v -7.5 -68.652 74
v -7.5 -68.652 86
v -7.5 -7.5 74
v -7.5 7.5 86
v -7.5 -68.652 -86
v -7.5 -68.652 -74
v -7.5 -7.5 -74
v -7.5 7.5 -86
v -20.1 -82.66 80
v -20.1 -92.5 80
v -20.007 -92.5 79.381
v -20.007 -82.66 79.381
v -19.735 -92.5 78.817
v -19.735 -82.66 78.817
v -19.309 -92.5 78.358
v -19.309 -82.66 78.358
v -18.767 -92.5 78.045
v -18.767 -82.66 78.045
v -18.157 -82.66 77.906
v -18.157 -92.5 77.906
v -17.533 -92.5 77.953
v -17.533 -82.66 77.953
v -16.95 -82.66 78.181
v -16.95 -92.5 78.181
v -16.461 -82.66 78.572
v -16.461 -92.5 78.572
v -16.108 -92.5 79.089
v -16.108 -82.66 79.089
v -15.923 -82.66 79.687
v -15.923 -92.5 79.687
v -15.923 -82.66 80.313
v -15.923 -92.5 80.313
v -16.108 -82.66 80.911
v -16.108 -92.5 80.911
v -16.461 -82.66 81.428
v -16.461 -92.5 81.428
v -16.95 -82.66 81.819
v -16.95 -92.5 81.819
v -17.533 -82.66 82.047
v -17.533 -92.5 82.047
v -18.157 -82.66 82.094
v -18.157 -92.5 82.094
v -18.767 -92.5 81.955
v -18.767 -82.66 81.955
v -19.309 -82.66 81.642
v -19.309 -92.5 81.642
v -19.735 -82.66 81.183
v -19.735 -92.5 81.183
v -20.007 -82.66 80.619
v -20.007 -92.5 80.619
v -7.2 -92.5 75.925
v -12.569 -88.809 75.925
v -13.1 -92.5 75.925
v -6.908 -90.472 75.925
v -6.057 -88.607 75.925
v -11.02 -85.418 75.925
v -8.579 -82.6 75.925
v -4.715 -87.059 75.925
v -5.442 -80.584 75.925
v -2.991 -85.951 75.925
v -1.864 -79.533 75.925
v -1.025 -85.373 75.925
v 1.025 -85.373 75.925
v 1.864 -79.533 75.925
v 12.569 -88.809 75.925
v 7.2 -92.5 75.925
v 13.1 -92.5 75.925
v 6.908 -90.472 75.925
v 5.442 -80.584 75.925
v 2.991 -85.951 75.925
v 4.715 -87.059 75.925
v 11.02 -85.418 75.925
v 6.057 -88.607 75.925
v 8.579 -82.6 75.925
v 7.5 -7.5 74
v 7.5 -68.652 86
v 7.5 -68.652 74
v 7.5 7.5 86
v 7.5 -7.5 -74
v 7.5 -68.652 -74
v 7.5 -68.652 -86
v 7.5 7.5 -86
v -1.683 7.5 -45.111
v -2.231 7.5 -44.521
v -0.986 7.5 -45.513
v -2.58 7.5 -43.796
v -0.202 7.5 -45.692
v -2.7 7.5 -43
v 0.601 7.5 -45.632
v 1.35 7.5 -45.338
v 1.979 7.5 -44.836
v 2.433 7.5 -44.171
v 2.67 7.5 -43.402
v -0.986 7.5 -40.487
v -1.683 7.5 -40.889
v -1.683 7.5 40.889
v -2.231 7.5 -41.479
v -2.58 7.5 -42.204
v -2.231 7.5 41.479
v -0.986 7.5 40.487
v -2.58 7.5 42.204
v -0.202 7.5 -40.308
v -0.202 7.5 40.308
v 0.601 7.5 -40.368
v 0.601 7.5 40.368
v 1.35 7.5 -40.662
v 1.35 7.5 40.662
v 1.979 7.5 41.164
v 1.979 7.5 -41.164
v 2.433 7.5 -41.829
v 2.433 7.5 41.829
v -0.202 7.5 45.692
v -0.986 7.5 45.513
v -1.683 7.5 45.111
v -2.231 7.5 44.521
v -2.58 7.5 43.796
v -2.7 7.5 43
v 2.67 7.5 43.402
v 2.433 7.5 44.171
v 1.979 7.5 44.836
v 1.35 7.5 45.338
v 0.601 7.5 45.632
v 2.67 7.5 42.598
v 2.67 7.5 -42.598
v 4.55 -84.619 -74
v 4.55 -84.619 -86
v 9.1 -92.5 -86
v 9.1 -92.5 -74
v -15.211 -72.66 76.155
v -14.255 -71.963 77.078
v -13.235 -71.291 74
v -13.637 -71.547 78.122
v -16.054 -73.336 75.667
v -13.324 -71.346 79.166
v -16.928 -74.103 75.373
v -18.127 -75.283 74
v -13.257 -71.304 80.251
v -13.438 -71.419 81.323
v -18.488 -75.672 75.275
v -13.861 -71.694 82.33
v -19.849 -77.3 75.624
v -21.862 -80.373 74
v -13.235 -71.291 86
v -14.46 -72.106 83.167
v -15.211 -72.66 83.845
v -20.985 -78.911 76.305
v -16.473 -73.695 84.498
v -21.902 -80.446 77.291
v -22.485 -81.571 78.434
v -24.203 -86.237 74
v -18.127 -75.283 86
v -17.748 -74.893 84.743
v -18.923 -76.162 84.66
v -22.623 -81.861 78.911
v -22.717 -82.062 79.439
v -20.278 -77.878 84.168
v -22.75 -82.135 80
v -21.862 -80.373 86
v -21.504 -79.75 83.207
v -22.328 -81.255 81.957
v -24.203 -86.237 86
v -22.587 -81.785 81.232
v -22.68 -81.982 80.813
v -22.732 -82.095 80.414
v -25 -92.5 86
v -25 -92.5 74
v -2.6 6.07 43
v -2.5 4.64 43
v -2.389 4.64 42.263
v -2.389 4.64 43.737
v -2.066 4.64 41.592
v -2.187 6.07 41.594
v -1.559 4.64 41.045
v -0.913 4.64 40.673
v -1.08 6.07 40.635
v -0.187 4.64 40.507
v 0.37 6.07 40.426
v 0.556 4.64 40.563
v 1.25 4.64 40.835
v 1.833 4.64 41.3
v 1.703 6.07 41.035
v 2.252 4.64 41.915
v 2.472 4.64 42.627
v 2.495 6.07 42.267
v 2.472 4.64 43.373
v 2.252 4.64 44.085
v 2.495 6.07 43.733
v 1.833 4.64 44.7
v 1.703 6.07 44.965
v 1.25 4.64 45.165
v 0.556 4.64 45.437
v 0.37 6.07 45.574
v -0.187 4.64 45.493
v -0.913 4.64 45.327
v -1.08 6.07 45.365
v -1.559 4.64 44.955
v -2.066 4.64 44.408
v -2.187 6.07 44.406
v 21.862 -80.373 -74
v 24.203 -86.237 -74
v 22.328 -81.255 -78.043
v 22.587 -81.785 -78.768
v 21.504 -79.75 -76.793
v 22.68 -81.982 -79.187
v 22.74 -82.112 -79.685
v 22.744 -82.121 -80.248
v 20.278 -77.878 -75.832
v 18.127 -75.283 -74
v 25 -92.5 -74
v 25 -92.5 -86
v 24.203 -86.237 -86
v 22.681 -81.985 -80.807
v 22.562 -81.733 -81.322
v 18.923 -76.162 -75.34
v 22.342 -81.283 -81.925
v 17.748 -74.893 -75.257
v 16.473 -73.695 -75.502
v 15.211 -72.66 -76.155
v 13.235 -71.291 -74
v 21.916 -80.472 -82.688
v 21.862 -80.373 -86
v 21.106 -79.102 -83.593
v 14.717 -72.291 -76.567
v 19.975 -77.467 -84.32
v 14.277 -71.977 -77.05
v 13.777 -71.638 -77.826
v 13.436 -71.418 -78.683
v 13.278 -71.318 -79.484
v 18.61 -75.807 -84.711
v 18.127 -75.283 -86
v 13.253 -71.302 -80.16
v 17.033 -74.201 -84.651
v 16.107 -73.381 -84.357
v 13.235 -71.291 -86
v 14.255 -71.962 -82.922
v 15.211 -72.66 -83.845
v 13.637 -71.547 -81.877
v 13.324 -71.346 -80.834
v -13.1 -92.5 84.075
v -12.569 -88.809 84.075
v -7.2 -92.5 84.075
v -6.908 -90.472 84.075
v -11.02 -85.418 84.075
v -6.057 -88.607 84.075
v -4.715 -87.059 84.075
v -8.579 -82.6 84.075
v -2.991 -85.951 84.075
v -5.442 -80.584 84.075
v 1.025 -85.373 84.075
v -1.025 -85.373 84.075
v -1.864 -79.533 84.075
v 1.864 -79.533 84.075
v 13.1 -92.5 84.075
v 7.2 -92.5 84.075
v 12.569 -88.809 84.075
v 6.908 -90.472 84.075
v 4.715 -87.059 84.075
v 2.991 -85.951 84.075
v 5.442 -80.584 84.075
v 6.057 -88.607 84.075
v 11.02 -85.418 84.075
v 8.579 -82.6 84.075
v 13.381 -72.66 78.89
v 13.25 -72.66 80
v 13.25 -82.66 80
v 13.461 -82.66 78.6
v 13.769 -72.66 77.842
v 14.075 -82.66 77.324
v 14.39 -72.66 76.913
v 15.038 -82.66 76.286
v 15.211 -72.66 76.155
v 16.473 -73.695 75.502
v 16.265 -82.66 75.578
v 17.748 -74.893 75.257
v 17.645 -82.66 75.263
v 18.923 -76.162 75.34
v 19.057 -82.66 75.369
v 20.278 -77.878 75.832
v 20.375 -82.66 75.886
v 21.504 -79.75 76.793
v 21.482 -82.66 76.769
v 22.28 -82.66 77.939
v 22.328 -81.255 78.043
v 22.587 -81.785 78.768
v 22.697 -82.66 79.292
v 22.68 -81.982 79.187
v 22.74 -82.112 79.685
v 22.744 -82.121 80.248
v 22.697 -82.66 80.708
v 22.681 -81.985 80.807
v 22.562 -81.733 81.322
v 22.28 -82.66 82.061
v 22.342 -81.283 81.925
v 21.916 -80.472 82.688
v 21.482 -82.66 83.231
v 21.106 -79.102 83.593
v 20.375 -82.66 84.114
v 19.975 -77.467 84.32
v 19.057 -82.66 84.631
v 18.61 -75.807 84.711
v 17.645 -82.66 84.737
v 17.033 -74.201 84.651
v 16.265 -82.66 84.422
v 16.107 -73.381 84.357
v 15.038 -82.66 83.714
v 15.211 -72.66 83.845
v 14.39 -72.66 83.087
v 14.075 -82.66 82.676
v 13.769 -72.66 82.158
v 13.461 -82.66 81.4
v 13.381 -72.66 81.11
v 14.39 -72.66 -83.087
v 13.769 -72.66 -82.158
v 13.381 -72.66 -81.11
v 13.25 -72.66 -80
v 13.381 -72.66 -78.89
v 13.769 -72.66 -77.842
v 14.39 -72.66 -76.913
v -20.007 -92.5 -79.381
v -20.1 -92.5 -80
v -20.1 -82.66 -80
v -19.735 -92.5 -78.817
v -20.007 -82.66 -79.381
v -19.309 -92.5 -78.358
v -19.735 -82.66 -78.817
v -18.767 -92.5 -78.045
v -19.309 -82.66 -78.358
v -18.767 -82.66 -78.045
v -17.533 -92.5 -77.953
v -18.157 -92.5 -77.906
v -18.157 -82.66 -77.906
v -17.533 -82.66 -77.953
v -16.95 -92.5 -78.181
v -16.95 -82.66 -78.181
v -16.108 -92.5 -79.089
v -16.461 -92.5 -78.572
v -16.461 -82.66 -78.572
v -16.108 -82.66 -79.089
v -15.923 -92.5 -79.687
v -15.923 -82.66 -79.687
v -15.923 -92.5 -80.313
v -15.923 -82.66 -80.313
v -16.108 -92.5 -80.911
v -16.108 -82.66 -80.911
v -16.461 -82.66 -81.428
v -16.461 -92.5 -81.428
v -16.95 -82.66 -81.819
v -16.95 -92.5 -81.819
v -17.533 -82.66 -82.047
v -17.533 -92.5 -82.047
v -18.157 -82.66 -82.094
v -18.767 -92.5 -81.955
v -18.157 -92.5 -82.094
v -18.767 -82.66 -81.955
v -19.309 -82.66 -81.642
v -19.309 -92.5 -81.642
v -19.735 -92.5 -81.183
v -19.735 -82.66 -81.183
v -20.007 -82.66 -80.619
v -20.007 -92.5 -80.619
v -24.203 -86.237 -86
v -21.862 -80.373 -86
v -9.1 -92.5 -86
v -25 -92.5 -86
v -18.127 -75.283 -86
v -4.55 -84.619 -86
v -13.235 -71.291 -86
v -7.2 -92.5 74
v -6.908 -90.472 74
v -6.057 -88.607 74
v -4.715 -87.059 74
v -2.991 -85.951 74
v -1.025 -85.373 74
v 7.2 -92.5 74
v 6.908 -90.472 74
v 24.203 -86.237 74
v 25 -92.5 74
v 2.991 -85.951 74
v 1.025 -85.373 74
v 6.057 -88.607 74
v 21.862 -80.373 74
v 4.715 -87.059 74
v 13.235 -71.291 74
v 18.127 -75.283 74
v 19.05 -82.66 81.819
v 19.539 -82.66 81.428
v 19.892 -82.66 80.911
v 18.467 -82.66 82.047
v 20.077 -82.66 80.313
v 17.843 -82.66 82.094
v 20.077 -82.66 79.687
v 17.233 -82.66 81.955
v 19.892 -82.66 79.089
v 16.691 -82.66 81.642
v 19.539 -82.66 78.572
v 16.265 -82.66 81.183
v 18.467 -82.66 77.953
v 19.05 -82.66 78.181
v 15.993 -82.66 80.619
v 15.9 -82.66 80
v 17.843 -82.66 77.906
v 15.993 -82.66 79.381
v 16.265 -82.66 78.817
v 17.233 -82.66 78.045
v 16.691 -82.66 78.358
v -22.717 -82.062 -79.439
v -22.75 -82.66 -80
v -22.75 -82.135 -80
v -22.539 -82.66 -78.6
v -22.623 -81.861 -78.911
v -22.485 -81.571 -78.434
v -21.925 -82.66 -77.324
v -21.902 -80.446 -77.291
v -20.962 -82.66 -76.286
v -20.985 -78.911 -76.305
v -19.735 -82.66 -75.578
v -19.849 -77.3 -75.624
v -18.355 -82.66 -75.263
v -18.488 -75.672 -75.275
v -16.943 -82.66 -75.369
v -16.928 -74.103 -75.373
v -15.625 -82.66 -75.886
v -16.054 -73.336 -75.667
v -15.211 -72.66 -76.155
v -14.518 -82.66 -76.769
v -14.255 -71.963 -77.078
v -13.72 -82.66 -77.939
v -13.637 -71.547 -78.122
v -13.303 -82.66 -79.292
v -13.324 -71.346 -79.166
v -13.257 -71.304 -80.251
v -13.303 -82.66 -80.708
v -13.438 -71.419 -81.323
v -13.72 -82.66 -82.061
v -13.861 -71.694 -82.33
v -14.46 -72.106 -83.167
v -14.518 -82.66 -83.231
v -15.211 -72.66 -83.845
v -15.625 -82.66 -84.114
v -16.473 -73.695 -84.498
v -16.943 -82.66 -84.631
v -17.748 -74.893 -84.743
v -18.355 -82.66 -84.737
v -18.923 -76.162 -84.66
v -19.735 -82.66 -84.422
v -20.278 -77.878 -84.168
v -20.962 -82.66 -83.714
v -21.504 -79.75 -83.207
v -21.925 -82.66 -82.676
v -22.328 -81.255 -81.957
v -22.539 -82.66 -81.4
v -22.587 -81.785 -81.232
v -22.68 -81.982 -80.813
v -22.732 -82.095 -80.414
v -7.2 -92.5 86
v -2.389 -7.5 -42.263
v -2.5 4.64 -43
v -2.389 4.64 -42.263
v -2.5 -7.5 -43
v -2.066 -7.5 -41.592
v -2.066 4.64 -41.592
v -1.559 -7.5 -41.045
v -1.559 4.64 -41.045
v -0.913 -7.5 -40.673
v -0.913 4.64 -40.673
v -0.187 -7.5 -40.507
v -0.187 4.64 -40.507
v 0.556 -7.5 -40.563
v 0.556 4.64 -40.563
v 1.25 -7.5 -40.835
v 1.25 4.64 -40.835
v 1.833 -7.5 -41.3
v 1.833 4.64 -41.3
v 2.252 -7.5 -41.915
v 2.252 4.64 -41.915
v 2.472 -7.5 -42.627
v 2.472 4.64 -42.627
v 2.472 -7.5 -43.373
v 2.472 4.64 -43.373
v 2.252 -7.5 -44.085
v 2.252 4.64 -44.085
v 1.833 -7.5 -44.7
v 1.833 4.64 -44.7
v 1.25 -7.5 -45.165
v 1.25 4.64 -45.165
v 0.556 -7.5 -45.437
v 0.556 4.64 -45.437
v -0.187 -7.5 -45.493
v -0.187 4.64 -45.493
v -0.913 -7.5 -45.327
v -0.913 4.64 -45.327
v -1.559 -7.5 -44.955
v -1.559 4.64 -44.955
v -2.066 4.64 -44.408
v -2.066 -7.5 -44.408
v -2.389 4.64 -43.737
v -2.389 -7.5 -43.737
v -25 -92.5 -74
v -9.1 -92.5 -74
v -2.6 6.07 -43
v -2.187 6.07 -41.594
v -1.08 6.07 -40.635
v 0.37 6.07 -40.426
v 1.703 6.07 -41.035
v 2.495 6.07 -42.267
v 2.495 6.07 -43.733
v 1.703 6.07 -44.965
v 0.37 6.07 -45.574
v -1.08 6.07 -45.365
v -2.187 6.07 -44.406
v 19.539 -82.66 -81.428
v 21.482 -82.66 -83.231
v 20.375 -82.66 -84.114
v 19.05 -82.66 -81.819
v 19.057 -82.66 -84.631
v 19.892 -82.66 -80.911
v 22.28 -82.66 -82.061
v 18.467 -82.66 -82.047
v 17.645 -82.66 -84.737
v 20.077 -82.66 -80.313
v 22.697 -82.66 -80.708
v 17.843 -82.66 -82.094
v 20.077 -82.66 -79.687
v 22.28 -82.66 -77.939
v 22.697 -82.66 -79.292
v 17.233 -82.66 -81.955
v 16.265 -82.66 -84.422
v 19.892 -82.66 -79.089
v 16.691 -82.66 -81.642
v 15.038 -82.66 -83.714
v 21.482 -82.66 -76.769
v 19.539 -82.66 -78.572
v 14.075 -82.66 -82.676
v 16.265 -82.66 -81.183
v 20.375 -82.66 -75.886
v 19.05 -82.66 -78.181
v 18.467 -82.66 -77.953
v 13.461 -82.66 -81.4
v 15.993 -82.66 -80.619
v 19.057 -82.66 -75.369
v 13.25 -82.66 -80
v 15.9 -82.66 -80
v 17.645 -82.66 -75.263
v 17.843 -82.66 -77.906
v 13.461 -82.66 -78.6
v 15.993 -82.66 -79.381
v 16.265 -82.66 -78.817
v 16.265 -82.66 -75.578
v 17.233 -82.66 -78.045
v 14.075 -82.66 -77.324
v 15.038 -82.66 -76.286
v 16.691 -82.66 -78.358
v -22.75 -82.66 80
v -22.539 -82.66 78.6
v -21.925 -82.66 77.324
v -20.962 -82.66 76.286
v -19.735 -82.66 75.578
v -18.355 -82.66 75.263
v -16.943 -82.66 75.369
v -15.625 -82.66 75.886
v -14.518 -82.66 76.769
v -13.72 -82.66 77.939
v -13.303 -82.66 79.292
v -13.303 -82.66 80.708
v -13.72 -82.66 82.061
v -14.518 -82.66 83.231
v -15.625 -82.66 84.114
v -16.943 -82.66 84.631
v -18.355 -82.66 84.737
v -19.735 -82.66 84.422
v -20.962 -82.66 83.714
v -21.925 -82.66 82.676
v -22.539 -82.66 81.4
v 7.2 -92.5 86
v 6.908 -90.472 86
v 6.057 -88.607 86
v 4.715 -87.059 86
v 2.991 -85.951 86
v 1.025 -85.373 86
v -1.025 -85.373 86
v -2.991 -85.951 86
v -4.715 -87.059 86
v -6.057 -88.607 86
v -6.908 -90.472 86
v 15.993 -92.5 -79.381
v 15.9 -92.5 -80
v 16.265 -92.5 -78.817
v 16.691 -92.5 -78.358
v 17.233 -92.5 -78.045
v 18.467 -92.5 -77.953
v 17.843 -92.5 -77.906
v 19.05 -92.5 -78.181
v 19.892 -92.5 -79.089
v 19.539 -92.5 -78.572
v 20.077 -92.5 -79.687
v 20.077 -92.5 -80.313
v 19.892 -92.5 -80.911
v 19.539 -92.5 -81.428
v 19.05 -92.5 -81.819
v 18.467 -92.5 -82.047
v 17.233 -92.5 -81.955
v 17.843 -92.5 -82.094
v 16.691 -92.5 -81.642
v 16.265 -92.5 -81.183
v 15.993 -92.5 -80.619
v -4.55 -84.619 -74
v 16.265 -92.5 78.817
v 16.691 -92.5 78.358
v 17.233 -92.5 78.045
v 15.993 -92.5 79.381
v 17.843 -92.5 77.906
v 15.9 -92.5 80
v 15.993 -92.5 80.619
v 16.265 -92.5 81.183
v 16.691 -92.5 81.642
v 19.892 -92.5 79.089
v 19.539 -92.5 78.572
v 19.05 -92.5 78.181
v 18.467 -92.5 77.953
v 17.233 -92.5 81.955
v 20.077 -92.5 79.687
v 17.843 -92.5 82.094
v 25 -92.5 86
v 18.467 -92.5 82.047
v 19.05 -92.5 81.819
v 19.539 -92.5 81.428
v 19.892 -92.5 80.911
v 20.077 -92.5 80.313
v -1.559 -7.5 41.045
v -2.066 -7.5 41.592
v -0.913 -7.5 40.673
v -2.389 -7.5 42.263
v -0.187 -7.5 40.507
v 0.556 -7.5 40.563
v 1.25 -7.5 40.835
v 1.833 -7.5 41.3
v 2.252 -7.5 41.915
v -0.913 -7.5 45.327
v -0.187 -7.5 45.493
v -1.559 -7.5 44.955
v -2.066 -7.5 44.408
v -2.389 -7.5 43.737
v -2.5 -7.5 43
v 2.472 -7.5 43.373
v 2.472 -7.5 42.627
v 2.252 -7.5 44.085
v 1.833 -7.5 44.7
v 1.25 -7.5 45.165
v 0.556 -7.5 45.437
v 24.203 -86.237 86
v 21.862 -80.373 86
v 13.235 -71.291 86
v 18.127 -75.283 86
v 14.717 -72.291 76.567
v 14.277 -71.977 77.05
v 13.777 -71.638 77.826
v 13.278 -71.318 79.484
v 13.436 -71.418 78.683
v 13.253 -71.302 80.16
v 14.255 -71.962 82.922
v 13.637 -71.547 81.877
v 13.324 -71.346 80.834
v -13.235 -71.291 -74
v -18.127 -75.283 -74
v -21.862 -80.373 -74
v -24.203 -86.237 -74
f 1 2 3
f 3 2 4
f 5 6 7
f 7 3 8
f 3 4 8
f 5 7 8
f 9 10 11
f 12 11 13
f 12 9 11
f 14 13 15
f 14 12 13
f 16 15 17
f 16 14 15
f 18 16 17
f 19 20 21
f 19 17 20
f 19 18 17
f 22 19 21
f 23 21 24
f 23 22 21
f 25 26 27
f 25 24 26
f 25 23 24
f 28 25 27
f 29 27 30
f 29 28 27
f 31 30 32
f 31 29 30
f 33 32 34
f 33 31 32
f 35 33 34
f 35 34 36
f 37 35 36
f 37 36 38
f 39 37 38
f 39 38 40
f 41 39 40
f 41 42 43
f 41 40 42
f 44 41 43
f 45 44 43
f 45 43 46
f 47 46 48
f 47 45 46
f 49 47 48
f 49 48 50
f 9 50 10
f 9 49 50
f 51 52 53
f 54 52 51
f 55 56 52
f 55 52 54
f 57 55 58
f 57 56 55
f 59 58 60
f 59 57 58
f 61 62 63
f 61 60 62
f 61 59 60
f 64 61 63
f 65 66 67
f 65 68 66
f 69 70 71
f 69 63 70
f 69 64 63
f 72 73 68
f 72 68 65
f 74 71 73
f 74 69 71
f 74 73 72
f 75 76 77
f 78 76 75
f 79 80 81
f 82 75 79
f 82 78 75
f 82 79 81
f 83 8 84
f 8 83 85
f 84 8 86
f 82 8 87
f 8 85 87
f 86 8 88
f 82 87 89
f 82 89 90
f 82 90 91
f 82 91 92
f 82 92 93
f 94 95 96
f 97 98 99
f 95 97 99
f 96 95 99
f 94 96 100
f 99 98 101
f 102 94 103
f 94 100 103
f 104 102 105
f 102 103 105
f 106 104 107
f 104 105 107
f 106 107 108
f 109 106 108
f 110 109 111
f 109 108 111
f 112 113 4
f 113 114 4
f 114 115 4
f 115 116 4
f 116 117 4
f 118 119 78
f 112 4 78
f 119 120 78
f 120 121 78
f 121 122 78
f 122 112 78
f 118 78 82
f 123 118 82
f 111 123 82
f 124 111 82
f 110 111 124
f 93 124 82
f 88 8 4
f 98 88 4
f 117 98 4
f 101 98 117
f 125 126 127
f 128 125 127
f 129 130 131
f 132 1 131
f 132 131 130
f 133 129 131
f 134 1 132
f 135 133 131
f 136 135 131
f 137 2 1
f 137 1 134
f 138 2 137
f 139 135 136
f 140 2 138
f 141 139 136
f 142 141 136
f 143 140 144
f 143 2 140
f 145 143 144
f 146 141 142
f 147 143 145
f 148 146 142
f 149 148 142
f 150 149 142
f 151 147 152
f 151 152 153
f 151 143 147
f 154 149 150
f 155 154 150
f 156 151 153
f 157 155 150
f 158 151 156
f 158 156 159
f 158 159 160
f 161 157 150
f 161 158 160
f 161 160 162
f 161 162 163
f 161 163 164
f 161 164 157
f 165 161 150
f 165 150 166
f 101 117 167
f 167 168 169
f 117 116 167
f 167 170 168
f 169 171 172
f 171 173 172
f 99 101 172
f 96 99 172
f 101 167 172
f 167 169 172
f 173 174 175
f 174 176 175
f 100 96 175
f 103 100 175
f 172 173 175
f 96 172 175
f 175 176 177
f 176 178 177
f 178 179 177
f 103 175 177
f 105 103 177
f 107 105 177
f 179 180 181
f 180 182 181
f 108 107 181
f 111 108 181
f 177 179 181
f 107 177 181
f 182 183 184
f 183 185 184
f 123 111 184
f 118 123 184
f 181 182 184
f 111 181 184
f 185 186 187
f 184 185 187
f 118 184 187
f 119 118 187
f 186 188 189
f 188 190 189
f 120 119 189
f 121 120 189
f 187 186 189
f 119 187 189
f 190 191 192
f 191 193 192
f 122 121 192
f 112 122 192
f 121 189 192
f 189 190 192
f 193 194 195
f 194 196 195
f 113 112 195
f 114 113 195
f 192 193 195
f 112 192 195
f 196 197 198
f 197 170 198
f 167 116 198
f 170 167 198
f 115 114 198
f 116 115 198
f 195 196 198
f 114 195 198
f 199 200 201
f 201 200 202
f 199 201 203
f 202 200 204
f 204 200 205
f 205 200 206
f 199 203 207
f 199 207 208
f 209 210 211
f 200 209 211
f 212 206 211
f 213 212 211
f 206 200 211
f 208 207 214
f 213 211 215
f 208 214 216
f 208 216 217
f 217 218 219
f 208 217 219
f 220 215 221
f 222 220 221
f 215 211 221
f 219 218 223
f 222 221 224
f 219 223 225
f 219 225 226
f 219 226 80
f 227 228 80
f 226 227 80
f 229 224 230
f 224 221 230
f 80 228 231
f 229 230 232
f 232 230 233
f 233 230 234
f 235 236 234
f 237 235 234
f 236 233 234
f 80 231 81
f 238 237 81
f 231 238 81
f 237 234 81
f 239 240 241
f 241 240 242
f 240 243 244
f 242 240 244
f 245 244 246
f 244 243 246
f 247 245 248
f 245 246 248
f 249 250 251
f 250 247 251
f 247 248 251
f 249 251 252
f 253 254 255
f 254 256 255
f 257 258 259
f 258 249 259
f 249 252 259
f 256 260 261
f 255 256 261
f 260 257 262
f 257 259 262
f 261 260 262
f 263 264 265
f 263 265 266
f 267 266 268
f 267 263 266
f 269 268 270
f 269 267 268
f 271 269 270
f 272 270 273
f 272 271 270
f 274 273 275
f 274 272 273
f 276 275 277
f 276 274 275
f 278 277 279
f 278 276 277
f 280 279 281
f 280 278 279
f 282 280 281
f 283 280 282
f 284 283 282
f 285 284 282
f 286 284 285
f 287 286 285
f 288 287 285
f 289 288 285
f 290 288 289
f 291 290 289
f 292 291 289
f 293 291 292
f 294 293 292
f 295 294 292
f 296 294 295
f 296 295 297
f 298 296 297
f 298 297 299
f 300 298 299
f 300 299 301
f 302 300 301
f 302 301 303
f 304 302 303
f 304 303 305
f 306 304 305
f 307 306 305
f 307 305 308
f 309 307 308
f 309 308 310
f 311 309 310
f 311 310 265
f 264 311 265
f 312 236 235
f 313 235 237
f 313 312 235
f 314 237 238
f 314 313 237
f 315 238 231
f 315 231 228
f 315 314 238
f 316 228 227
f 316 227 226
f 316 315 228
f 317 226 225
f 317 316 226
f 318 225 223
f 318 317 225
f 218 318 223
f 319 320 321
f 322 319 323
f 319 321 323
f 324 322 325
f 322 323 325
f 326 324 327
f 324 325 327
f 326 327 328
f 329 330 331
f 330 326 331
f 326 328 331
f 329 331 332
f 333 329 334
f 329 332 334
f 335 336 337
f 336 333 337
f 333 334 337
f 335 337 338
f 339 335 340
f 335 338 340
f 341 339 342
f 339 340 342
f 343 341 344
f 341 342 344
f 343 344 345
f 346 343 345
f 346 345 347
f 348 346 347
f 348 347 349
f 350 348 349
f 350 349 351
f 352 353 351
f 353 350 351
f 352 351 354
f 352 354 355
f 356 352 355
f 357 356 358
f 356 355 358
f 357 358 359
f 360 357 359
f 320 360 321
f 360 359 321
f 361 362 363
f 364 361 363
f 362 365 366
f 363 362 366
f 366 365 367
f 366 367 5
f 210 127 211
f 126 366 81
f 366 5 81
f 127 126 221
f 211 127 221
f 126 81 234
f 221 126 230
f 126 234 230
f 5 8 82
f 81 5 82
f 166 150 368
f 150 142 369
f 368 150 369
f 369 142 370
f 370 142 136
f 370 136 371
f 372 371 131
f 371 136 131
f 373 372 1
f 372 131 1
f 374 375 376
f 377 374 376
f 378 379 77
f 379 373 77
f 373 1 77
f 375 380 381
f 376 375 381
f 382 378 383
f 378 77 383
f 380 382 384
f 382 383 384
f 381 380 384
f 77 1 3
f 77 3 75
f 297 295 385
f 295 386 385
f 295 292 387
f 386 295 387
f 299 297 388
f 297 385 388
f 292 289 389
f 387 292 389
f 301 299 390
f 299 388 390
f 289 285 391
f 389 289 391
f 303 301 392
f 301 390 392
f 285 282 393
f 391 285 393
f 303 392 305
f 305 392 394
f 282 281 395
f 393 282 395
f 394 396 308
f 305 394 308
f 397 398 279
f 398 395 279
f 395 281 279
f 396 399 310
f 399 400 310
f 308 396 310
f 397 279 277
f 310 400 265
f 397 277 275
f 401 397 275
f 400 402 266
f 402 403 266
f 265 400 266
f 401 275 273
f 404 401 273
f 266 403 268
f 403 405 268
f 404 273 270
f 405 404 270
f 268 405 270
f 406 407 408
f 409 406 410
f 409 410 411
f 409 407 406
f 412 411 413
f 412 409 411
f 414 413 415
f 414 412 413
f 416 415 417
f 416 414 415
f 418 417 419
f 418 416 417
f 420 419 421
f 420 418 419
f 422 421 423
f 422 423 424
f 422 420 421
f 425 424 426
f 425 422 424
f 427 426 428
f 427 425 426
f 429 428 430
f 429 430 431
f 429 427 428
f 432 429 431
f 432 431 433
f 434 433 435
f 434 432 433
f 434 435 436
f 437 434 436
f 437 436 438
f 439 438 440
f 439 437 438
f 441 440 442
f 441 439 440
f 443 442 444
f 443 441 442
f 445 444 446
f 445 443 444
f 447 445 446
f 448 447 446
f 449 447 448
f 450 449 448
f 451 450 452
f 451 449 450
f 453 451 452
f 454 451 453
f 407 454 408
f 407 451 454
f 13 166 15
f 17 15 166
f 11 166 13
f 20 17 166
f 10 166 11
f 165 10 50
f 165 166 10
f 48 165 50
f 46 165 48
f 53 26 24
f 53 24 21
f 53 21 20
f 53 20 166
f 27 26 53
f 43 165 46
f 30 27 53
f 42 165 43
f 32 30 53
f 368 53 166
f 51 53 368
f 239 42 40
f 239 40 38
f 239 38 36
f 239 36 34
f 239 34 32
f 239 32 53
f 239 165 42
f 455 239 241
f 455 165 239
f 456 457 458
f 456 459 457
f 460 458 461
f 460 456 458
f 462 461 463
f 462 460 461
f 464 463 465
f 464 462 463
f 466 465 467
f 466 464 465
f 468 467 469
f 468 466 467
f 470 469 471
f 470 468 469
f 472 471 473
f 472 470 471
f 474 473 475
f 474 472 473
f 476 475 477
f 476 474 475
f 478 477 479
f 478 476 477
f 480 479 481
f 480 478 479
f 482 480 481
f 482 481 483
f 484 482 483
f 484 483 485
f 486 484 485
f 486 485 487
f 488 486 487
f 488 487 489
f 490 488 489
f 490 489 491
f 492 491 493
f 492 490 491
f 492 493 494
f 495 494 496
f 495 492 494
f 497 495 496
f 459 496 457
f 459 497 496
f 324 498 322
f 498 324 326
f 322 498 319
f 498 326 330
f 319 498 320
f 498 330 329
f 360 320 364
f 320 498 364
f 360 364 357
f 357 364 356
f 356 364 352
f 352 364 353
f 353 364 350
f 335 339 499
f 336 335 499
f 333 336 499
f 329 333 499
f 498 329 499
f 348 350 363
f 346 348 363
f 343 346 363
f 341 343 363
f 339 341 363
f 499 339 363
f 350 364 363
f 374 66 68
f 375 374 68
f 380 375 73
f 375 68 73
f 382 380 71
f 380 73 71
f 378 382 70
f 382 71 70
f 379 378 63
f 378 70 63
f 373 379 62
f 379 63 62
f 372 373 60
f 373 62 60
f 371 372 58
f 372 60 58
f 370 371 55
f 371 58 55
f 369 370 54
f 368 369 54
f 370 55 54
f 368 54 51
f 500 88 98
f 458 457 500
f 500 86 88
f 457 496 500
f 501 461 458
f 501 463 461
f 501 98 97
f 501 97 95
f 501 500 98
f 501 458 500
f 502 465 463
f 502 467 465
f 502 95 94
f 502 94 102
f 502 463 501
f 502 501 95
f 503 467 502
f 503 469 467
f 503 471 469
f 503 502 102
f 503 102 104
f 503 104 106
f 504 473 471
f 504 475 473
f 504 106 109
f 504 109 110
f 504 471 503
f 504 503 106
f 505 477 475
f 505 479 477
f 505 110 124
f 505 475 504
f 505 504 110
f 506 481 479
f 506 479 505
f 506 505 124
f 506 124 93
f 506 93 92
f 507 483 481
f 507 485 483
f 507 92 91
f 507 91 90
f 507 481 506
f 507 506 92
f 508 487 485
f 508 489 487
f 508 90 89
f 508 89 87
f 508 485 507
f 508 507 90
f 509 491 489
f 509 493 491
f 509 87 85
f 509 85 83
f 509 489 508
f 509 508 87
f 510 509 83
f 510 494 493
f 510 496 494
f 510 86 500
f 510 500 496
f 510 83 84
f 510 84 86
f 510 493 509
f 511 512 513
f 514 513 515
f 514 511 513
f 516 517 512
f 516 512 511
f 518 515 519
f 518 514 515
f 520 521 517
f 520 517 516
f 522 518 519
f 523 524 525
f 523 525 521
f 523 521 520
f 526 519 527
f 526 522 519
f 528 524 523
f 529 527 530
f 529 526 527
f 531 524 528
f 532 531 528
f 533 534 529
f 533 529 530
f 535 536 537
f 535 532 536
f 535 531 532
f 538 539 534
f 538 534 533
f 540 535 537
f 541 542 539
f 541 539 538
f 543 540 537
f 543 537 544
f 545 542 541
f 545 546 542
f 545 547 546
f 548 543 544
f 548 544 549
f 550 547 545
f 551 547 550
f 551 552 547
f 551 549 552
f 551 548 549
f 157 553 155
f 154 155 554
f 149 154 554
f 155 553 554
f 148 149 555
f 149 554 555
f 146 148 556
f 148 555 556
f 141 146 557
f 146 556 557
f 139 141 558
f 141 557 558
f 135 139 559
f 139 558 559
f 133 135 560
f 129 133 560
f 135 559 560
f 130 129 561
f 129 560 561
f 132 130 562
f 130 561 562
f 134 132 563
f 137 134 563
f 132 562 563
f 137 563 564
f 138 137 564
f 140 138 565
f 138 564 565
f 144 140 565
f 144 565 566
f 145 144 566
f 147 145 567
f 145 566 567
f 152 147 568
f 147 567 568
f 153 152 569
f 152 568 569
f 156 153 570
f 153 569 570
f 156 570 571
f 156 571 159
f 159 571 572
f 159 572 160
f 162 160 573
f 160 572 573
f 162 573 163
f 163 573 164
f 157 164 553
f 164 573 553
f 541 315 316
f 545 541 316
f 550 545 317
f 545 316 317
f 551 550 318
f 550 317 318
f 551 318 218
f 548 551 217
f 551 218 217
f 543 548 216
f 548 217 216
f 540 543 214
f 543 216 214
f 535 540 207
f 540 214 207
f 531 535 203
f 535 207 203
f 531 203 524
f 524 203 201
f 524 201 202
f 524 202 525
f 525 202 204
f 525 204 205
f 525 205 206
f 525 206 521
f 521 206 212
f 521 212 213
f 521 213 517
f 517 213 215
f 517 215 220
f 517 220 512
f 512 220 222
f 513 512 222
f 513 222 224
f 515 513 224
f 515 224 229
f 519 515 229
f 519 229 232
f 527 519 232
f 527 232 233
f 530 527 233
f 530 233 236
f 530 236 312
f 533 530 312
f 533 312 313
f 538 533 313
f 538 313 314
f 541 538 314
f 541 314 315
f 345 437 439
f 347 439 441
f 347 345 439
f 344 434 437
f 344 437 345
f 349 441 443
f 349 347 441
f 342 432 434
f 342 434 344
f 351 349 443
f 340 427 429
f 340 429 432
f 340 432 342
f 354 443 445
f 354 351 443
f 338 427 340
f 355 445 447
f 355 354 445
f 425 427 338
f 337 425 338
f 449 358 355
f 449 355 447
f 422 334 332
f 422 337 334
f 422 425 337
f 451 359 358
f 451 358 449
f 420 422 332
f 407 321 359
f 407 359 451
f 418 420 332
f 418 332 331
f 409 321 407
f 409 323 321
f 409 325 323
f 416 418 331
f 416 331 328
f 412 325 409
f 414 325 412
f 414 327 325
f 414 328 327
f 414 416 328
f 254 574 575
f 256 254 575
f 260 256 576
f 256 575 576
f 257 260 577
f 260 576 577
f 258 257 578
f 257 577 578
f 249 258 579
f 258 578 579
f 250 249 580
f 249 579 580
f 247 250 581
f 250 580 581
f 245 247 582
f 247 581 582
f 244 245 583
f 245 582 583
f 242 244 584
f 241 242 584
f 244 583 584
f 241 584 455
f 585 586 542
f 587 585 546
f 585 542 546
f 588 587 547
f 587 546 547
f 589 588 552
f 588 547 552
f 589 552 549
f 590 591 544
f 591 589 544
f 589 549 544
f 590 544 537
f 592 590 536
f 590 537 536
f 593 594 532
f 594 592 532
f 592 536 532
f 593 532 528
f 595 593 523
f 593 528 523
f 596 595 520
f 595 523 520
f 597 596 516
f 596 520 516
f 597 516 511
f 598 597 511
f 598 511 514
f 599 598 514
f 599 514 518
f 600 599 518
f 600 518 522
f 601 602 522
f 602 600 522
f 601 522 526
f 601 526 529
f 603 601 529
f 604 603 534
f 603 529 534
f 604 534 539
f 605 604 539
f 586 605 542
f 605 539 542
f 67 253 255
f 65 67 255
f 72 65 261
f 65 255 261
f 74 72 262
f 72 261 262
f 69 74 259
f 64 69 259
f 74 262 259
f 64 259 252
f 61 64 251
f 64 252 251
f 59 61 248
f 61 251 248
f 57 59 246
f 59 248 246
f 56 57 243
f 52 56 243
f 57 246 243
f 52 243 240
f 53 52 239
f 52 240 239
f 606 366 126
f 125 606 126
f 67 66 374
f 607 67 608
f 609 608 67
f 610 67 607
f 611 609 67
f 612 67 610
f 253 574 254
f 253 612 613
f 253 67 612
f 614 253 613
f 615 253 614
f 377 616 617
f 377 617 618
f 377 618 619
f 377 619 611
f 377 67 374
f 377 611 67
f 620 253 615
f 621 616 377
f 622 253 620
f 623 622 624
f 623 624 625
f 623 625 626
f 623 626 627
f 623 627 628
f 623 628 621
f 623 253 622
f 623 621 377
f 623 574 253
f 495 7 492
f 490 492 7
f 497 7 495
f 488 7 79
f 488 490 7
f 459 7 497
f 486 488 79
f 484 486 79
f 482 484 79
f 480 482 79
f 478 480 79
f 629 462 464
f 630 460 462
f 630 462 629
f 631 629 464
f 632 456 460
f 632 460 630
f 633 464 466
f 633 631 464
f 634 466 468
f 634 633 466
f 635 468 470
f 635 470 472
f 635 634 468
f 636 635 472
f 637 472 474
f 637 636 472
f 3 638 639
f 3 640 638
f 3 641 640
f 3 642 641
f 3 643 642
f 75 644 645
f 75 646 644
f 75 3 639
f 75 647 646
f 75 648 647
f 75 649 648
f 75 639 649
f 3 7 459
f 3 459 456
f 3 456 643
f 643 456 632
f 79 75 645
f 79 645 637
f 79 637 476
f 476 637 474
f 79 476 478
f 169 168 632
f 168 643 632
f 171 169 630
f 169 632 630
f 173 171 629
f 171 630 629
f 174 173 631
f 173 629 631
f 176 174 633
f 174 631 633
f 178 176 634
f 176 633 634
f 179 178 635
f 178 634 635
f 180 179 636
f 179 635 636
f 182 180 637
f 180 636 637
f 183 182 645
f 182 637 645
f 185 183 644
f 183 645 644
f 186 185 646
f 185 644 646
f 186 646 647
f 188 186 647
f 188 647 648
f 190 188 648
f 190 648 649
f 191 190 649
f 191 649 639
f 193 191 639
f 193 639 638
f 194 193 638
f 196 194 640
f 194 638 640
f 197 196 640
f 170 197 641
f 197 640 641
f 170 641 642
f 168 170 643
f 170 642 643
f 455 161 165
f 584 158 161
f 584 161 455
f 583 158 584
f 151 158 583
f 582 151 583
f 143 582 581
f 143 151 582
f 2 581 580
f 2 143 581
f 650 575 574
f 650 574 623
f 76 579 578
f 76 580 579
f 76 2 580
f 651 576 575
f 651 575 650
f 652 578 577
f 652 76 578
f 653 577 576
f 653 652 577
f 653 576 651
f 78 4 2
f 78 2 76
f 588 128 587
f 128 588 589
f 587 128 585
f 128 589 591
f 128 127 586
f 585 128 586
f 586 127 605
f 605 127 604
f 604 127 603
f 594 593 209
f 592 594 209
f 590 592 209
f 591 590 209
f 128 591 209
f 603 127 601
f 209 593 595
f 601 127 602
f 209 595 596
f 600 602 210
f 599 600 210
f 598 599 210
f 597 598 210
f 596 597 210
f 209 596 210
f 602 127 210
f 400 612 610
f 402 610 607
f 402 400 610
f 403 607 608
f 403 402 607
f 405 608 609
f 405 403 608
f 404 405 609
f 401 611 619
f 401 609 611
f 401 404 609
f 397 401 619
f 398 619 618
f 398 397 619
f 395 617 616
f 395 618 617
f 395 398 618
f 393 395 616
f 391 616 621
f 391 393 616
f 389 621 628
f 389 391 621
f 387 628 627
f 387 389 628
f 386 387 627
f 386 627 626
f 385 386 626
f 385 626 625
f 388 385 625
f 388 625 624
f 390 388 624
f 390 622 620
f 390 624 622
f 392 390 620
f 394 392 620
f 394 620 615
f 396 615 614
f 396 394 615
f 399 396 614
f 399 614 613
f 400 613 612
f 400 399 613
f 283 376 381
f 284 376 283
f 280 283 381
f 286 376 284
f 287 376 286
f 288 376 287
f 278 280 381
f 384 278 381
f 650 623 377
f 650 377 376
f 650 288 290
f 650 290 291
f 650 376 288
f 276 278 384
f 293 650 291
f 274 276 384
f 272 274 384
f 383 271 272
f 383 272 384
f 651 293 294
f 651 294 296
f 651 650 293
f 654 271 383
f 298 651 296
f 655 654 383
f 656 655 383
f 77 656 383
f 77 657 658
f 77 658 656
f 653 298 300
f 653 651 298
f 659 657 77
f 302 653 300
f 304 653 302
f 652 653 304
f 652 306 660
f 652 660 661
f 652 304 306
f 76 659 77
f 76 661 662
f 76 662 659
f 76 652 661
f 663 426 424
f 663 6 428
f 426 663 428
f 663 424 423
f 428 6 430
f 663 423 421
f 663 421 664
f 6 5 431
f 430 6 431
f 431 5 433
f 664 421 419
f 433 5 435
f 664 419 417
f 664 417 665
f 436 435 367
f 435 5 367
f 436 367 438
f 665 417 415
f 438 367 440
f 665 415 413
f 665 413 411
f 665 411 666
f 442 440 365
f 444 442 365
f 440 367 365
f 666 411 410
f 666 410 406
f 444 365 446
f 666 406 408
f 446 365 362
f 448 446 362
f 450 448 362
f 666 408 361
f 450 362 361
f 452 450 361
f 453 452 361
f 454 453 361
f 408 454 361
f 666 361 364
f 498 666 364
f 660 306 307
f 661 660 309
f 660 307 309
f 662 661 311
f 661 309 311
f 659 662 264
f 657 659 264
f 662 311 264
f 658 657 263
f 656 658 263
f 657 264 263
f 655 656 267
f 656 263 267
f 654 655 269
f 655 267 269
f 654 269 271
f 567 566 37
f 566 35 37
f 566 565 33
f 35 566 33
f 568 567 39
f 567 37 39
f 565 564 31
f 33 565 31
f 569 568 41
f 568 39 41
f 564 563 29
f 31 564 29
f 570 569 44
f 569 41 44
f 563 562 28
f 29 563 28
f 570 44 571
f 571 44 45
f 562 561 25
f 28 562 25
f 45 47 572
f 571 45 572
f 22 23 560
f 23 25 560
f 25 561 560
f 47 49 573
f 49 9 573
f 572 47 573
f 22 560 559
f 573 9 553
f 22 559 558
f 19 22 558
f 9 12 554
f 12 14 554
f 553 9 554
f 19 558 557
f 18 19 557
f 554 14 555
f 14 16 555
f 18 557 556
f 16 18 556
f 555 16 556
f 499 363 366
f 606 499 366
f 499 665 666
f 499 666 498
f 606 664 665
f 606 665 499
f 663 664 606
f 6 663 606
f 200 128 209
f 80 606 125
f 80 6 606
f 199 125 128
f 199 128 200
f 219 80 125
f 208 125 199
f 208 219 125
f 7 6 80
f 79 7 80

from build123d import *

# Parameters (mm, degrees)
SKETCH2_W                                       = 15
SKETCH2_H                                       = 15
BOSS_EXTRUDE1_DEPTH                             = 86
SKETCH3_W                                       = 15
SKETCH3_H                                       = 12
BOSS_EXTRUDE2_DEPTH                             = 85
BOSS_EXTRUDE3_DEPTH                             = 12
SKETCH6_R                                       = 4.75
SKETCH6_R_2                                     = 2.1
CUT_EXTRUDE1_DEPTH                              = 10
CUT_EXTRUDE1_DIRECTION_2_REACH                  = 82.16
CUT_EXTRUDE2_REACH                              = 21.84
SKETCH6_2_R                                     = 2.1
CSK_FOR_M3_OVAL_HEAD_MACHINE_SCREW1_D           = 5
CSK_FOR_M3_OVAL_HEAD_MACHINE_SCREW1_CSINK_D     = 5.4
CSK_FOR_M3_OVAL_HEAD_MACHINE_SCREW1_CSINK_ANGLE = 8
CUT_EXTRUDE4_REACH                              = 174
SKETCH8_R                                       = 7.2
CUT_EXTRUDE5_START                              = -1.925
SKETCH9_R                                       = 13.1
CUT_EXTRUDE5_DEPTH                              = 8.15
CUT_EXTRUDE6_REACH                              = 174


with BuildPart() as part:
    # Sketch2 → Boss-Extrude1 (new body)
    with BuildSketch(Plane.XY):
        Rectangle(SKETCH2_W, SKETCH2_H)
    extrude(amount=BOSS_EXTRUDE1_DEPTH)

    # Sketch3 → Boss-Extrude2 (add)
    with BuildSketch(Plane.XZ.offset(7.5)):
        with Locations((0, 80)):
            Rectangle(SKETCH3_W, SKETCH3_H)
    extrude(amount=BOSS_EXTRUDE2_DEPTH)

    # Sketch4 → Boss-Extrude3 (add)
    with BuildSketch(Plane.XY.offset(86)):
        with BuildLine():
            Line((-25, -92.5), (25, -92.5))
            ThreePointArc((25, -92.5), (0, -67.5), (-25, -92.5))
        make_face()
    extrude(amount=-BOSS_EXTRUDE3_DEPTH)

    # Sketch6 → Cut-Extrude1 (cut)
    with BuildSketch(Plane(origin=(0, -72.66, 0), x_dir=(-1, 0, 0), z_dir=(0, -1, 0))):
        with Locations((-18, -80)):
            Circle(SKETCH6_R)
        with Locations((-18, -80)):
            Circle(SKETCH6_R_2, mode=Mode.SUBTRACT)
        with Locations((18, -80)):
            Circle(SKETCH6_R)
        with Locations((18, -80)):
            Circle(SKETCH6_R_2, mode=Mode.SUBTRACT)
    extrude(amount=CUT_EXTRUDE1_DEPTH, mode=Mode.SUBTRACT)

    # Sketch6 → Cut-Extrude1 direction 2 (cut, up to next)
    with BuildSketch(Plane(origin=(0, -72.66, 0), x_dir=(-1, 0, 0), z_dir=(0, -1, 0)), mode=Mode.PRIVATE) as cut_extrude1_direction_2_sk1:
        with Locations((-18, -80)):
            Circle(SKETCH6_R)
        with Locations((-18, -80)):
            Circle(SKETCH6_R_2, mode=Mode.SUBTRACT)
    cut_extrude1_direction_2_tool1 = extrude(cut_extrude1_direction_2_sk1.sketch, amount=-CUT_EXTRUDE1_DIRECTION_2_REACH, mode=Mode.PRIVATE) & part.part
    add(cut_extrude1_direction_2_tool1.solids().sort_by_distance((22.61565, -72.66, 80))[0], mode=Mode.SUBTRACT)
    # Sketch6 → Cut-Extrude1 direction 2 (cut, up to next)
    with BuildSketch(Plane(origin=(0, -72.66, 0), x_dir=(-1, 0, 0), z_dir=(0, -1, 0)), mode=Mode.PRIVATE) as cut_extrude1_direction_2_sk2:
        with Locations((18, -80)):
            Circle(SKETCH6_R)
        with Locations((18, -80)):
            Circle(SKETCH6_R_2, mode=Mode.SUBTRACT)
    cut_extrude1_direction_2_tool2 = extrude(cut_extrude1_direction_2_sk2.sketch, amount=-CUT_EXTRUDE1_DIRECTION_2_REACH, mode=Mode.PRIVATE) & part.part
    add(cut_extrude1_direction_2_tool2.solids().sort_by_distance((-13.38435, -72.66, 80))[0], mode=Mode.SUBTRACT)

    # Sketch6<2> → Cut-Extrude2 (cut, up to next)
    with BuildSketch(Plane(origin=(0, -72.66, 0), x_dir=(-1, 0, 0), z_dir=(0, -1, 0)), mode=Mode.PRIVATE) as cut_extrude2_sk1:
        with Locations((-18, -80)):
            Circle(SKETCH6_2_R)
    cut_extrude2_tool1 = extrude(cut_extrude2_sk1.sketch, amount=CUT_EXTRUDE2_REACH, mode=Mode.PRIVATE) & part.part
    add(cut_extrude2_tool1.solids().sort_by_distance((18, -72.66, 80))[0], mode=Mode.SUBTRACT)
    # Sketch6<2> → Cut-Extrude2 (cut, up to next)
    with BuildSketch(Plane(origin=(0, -72.66, 0), x_dir=(-1, 0, 0), z_dir=(0, -1, 0)), mode=Mode.PRIVATE) as cut_extrude2_sk2:
        with Locations((18, -80)):
            Circle(SKETCH6_2_R)
    cut_extrude2_tool2 = extrude(cut_extrude2_sk2.sketch, amount=CUT_EXTRUDE2_REACH, mode=Mode.PRIVATE) & part.part
    add(cut_extrude2_tool2.solids().sort_by_distance((-18, -72.66, 80))[0], mode=Mode.SUBTRACT)

    # CSK for M3 Oval Head Machine Screw1 (through all)
    with Locations(Plane(origin=(0, 7.5, 0), x_dir=(1, 0, 0), z_dir=(0, 1, 0))):
        with Locations((0, -43)):
            CounterSinkHole(CSK_FOR_M3_OVAL_HEAD_MACHINE_SCREW1_D / 2, CSK_FOR_M3_OVAL_HEAD_MACHINE_SCREW1_CSINK_D / 2, counter_sink_angle=CSK_FOR_M3_OVAL_HEAD_MACHINE_SCREW1_CSINK_ANGLE)

    # Mirror1: part across plane


with BuildPart() as part_1:
    add(part.part)
    add(part.part.mirror(Plane.XY))

    # Sketch8 → Cut-Extrude4 (cut, up to next)
    with BuildSketch(Plane.XY.offset(86), mode=Mode.PRIVATE) as cut_extrude4_sk1:
        with Locations((0, -92.5)):
            Circle(SKETCH8_R)
    cut_extrude4_tool1 = extrude(cut_extrude4_sk1.sketch, amount=-CUT_EXTRUDE4_REACH, mode=Mode.PRIVATE) & part_1.part
    add(cut_extrude4_tool1.solids().sort_by_distance((0, -92.5, 86))[0], mode=Mode.SUBTRACT)

    # Sketch9 → Cut-Extrude5 (cut)
    with BuildSketch(Plane.XY.offset(86).offset(CUT_EXTRUDE5_START)):
        with Locations((0, -92.5)):
            Circle(SKETCH9_R)
    extrude(amount=-CUT_EXTRUDE5_DEPTH, mode=Mode.SUBTRACT)

    # Sketch10 → Cut-Extrude6 (cut, up to next)
    with BuildSketch(Plane(origin=(0, 0, -86), x_dir=(-1, 0, 0), z_dir=(0, 0, -1)), mode=Mode.PRIVATE) as cut_extrude6_sk1:
        Polygon((9.1, -92.5), (4.55, -84.619168826), (-4.55, -84.619168826), (-9.1, -92.5), (-4.55, -100.380831174), (4.55, -100.380831174), align=None)
    cut_extrude6_tool1 = extrude(cut_extrude6_sk1.sketch, amount=-CUT_EXTRUDE6_REACH, mode=Mode.PRIVATE) & part_1.part
    add(cut_extrude6_tool1.solids().sort_by_distance((0, -92.5, -86))[0], mode=Mode.SUBTRACT)


solid = part_1.part
